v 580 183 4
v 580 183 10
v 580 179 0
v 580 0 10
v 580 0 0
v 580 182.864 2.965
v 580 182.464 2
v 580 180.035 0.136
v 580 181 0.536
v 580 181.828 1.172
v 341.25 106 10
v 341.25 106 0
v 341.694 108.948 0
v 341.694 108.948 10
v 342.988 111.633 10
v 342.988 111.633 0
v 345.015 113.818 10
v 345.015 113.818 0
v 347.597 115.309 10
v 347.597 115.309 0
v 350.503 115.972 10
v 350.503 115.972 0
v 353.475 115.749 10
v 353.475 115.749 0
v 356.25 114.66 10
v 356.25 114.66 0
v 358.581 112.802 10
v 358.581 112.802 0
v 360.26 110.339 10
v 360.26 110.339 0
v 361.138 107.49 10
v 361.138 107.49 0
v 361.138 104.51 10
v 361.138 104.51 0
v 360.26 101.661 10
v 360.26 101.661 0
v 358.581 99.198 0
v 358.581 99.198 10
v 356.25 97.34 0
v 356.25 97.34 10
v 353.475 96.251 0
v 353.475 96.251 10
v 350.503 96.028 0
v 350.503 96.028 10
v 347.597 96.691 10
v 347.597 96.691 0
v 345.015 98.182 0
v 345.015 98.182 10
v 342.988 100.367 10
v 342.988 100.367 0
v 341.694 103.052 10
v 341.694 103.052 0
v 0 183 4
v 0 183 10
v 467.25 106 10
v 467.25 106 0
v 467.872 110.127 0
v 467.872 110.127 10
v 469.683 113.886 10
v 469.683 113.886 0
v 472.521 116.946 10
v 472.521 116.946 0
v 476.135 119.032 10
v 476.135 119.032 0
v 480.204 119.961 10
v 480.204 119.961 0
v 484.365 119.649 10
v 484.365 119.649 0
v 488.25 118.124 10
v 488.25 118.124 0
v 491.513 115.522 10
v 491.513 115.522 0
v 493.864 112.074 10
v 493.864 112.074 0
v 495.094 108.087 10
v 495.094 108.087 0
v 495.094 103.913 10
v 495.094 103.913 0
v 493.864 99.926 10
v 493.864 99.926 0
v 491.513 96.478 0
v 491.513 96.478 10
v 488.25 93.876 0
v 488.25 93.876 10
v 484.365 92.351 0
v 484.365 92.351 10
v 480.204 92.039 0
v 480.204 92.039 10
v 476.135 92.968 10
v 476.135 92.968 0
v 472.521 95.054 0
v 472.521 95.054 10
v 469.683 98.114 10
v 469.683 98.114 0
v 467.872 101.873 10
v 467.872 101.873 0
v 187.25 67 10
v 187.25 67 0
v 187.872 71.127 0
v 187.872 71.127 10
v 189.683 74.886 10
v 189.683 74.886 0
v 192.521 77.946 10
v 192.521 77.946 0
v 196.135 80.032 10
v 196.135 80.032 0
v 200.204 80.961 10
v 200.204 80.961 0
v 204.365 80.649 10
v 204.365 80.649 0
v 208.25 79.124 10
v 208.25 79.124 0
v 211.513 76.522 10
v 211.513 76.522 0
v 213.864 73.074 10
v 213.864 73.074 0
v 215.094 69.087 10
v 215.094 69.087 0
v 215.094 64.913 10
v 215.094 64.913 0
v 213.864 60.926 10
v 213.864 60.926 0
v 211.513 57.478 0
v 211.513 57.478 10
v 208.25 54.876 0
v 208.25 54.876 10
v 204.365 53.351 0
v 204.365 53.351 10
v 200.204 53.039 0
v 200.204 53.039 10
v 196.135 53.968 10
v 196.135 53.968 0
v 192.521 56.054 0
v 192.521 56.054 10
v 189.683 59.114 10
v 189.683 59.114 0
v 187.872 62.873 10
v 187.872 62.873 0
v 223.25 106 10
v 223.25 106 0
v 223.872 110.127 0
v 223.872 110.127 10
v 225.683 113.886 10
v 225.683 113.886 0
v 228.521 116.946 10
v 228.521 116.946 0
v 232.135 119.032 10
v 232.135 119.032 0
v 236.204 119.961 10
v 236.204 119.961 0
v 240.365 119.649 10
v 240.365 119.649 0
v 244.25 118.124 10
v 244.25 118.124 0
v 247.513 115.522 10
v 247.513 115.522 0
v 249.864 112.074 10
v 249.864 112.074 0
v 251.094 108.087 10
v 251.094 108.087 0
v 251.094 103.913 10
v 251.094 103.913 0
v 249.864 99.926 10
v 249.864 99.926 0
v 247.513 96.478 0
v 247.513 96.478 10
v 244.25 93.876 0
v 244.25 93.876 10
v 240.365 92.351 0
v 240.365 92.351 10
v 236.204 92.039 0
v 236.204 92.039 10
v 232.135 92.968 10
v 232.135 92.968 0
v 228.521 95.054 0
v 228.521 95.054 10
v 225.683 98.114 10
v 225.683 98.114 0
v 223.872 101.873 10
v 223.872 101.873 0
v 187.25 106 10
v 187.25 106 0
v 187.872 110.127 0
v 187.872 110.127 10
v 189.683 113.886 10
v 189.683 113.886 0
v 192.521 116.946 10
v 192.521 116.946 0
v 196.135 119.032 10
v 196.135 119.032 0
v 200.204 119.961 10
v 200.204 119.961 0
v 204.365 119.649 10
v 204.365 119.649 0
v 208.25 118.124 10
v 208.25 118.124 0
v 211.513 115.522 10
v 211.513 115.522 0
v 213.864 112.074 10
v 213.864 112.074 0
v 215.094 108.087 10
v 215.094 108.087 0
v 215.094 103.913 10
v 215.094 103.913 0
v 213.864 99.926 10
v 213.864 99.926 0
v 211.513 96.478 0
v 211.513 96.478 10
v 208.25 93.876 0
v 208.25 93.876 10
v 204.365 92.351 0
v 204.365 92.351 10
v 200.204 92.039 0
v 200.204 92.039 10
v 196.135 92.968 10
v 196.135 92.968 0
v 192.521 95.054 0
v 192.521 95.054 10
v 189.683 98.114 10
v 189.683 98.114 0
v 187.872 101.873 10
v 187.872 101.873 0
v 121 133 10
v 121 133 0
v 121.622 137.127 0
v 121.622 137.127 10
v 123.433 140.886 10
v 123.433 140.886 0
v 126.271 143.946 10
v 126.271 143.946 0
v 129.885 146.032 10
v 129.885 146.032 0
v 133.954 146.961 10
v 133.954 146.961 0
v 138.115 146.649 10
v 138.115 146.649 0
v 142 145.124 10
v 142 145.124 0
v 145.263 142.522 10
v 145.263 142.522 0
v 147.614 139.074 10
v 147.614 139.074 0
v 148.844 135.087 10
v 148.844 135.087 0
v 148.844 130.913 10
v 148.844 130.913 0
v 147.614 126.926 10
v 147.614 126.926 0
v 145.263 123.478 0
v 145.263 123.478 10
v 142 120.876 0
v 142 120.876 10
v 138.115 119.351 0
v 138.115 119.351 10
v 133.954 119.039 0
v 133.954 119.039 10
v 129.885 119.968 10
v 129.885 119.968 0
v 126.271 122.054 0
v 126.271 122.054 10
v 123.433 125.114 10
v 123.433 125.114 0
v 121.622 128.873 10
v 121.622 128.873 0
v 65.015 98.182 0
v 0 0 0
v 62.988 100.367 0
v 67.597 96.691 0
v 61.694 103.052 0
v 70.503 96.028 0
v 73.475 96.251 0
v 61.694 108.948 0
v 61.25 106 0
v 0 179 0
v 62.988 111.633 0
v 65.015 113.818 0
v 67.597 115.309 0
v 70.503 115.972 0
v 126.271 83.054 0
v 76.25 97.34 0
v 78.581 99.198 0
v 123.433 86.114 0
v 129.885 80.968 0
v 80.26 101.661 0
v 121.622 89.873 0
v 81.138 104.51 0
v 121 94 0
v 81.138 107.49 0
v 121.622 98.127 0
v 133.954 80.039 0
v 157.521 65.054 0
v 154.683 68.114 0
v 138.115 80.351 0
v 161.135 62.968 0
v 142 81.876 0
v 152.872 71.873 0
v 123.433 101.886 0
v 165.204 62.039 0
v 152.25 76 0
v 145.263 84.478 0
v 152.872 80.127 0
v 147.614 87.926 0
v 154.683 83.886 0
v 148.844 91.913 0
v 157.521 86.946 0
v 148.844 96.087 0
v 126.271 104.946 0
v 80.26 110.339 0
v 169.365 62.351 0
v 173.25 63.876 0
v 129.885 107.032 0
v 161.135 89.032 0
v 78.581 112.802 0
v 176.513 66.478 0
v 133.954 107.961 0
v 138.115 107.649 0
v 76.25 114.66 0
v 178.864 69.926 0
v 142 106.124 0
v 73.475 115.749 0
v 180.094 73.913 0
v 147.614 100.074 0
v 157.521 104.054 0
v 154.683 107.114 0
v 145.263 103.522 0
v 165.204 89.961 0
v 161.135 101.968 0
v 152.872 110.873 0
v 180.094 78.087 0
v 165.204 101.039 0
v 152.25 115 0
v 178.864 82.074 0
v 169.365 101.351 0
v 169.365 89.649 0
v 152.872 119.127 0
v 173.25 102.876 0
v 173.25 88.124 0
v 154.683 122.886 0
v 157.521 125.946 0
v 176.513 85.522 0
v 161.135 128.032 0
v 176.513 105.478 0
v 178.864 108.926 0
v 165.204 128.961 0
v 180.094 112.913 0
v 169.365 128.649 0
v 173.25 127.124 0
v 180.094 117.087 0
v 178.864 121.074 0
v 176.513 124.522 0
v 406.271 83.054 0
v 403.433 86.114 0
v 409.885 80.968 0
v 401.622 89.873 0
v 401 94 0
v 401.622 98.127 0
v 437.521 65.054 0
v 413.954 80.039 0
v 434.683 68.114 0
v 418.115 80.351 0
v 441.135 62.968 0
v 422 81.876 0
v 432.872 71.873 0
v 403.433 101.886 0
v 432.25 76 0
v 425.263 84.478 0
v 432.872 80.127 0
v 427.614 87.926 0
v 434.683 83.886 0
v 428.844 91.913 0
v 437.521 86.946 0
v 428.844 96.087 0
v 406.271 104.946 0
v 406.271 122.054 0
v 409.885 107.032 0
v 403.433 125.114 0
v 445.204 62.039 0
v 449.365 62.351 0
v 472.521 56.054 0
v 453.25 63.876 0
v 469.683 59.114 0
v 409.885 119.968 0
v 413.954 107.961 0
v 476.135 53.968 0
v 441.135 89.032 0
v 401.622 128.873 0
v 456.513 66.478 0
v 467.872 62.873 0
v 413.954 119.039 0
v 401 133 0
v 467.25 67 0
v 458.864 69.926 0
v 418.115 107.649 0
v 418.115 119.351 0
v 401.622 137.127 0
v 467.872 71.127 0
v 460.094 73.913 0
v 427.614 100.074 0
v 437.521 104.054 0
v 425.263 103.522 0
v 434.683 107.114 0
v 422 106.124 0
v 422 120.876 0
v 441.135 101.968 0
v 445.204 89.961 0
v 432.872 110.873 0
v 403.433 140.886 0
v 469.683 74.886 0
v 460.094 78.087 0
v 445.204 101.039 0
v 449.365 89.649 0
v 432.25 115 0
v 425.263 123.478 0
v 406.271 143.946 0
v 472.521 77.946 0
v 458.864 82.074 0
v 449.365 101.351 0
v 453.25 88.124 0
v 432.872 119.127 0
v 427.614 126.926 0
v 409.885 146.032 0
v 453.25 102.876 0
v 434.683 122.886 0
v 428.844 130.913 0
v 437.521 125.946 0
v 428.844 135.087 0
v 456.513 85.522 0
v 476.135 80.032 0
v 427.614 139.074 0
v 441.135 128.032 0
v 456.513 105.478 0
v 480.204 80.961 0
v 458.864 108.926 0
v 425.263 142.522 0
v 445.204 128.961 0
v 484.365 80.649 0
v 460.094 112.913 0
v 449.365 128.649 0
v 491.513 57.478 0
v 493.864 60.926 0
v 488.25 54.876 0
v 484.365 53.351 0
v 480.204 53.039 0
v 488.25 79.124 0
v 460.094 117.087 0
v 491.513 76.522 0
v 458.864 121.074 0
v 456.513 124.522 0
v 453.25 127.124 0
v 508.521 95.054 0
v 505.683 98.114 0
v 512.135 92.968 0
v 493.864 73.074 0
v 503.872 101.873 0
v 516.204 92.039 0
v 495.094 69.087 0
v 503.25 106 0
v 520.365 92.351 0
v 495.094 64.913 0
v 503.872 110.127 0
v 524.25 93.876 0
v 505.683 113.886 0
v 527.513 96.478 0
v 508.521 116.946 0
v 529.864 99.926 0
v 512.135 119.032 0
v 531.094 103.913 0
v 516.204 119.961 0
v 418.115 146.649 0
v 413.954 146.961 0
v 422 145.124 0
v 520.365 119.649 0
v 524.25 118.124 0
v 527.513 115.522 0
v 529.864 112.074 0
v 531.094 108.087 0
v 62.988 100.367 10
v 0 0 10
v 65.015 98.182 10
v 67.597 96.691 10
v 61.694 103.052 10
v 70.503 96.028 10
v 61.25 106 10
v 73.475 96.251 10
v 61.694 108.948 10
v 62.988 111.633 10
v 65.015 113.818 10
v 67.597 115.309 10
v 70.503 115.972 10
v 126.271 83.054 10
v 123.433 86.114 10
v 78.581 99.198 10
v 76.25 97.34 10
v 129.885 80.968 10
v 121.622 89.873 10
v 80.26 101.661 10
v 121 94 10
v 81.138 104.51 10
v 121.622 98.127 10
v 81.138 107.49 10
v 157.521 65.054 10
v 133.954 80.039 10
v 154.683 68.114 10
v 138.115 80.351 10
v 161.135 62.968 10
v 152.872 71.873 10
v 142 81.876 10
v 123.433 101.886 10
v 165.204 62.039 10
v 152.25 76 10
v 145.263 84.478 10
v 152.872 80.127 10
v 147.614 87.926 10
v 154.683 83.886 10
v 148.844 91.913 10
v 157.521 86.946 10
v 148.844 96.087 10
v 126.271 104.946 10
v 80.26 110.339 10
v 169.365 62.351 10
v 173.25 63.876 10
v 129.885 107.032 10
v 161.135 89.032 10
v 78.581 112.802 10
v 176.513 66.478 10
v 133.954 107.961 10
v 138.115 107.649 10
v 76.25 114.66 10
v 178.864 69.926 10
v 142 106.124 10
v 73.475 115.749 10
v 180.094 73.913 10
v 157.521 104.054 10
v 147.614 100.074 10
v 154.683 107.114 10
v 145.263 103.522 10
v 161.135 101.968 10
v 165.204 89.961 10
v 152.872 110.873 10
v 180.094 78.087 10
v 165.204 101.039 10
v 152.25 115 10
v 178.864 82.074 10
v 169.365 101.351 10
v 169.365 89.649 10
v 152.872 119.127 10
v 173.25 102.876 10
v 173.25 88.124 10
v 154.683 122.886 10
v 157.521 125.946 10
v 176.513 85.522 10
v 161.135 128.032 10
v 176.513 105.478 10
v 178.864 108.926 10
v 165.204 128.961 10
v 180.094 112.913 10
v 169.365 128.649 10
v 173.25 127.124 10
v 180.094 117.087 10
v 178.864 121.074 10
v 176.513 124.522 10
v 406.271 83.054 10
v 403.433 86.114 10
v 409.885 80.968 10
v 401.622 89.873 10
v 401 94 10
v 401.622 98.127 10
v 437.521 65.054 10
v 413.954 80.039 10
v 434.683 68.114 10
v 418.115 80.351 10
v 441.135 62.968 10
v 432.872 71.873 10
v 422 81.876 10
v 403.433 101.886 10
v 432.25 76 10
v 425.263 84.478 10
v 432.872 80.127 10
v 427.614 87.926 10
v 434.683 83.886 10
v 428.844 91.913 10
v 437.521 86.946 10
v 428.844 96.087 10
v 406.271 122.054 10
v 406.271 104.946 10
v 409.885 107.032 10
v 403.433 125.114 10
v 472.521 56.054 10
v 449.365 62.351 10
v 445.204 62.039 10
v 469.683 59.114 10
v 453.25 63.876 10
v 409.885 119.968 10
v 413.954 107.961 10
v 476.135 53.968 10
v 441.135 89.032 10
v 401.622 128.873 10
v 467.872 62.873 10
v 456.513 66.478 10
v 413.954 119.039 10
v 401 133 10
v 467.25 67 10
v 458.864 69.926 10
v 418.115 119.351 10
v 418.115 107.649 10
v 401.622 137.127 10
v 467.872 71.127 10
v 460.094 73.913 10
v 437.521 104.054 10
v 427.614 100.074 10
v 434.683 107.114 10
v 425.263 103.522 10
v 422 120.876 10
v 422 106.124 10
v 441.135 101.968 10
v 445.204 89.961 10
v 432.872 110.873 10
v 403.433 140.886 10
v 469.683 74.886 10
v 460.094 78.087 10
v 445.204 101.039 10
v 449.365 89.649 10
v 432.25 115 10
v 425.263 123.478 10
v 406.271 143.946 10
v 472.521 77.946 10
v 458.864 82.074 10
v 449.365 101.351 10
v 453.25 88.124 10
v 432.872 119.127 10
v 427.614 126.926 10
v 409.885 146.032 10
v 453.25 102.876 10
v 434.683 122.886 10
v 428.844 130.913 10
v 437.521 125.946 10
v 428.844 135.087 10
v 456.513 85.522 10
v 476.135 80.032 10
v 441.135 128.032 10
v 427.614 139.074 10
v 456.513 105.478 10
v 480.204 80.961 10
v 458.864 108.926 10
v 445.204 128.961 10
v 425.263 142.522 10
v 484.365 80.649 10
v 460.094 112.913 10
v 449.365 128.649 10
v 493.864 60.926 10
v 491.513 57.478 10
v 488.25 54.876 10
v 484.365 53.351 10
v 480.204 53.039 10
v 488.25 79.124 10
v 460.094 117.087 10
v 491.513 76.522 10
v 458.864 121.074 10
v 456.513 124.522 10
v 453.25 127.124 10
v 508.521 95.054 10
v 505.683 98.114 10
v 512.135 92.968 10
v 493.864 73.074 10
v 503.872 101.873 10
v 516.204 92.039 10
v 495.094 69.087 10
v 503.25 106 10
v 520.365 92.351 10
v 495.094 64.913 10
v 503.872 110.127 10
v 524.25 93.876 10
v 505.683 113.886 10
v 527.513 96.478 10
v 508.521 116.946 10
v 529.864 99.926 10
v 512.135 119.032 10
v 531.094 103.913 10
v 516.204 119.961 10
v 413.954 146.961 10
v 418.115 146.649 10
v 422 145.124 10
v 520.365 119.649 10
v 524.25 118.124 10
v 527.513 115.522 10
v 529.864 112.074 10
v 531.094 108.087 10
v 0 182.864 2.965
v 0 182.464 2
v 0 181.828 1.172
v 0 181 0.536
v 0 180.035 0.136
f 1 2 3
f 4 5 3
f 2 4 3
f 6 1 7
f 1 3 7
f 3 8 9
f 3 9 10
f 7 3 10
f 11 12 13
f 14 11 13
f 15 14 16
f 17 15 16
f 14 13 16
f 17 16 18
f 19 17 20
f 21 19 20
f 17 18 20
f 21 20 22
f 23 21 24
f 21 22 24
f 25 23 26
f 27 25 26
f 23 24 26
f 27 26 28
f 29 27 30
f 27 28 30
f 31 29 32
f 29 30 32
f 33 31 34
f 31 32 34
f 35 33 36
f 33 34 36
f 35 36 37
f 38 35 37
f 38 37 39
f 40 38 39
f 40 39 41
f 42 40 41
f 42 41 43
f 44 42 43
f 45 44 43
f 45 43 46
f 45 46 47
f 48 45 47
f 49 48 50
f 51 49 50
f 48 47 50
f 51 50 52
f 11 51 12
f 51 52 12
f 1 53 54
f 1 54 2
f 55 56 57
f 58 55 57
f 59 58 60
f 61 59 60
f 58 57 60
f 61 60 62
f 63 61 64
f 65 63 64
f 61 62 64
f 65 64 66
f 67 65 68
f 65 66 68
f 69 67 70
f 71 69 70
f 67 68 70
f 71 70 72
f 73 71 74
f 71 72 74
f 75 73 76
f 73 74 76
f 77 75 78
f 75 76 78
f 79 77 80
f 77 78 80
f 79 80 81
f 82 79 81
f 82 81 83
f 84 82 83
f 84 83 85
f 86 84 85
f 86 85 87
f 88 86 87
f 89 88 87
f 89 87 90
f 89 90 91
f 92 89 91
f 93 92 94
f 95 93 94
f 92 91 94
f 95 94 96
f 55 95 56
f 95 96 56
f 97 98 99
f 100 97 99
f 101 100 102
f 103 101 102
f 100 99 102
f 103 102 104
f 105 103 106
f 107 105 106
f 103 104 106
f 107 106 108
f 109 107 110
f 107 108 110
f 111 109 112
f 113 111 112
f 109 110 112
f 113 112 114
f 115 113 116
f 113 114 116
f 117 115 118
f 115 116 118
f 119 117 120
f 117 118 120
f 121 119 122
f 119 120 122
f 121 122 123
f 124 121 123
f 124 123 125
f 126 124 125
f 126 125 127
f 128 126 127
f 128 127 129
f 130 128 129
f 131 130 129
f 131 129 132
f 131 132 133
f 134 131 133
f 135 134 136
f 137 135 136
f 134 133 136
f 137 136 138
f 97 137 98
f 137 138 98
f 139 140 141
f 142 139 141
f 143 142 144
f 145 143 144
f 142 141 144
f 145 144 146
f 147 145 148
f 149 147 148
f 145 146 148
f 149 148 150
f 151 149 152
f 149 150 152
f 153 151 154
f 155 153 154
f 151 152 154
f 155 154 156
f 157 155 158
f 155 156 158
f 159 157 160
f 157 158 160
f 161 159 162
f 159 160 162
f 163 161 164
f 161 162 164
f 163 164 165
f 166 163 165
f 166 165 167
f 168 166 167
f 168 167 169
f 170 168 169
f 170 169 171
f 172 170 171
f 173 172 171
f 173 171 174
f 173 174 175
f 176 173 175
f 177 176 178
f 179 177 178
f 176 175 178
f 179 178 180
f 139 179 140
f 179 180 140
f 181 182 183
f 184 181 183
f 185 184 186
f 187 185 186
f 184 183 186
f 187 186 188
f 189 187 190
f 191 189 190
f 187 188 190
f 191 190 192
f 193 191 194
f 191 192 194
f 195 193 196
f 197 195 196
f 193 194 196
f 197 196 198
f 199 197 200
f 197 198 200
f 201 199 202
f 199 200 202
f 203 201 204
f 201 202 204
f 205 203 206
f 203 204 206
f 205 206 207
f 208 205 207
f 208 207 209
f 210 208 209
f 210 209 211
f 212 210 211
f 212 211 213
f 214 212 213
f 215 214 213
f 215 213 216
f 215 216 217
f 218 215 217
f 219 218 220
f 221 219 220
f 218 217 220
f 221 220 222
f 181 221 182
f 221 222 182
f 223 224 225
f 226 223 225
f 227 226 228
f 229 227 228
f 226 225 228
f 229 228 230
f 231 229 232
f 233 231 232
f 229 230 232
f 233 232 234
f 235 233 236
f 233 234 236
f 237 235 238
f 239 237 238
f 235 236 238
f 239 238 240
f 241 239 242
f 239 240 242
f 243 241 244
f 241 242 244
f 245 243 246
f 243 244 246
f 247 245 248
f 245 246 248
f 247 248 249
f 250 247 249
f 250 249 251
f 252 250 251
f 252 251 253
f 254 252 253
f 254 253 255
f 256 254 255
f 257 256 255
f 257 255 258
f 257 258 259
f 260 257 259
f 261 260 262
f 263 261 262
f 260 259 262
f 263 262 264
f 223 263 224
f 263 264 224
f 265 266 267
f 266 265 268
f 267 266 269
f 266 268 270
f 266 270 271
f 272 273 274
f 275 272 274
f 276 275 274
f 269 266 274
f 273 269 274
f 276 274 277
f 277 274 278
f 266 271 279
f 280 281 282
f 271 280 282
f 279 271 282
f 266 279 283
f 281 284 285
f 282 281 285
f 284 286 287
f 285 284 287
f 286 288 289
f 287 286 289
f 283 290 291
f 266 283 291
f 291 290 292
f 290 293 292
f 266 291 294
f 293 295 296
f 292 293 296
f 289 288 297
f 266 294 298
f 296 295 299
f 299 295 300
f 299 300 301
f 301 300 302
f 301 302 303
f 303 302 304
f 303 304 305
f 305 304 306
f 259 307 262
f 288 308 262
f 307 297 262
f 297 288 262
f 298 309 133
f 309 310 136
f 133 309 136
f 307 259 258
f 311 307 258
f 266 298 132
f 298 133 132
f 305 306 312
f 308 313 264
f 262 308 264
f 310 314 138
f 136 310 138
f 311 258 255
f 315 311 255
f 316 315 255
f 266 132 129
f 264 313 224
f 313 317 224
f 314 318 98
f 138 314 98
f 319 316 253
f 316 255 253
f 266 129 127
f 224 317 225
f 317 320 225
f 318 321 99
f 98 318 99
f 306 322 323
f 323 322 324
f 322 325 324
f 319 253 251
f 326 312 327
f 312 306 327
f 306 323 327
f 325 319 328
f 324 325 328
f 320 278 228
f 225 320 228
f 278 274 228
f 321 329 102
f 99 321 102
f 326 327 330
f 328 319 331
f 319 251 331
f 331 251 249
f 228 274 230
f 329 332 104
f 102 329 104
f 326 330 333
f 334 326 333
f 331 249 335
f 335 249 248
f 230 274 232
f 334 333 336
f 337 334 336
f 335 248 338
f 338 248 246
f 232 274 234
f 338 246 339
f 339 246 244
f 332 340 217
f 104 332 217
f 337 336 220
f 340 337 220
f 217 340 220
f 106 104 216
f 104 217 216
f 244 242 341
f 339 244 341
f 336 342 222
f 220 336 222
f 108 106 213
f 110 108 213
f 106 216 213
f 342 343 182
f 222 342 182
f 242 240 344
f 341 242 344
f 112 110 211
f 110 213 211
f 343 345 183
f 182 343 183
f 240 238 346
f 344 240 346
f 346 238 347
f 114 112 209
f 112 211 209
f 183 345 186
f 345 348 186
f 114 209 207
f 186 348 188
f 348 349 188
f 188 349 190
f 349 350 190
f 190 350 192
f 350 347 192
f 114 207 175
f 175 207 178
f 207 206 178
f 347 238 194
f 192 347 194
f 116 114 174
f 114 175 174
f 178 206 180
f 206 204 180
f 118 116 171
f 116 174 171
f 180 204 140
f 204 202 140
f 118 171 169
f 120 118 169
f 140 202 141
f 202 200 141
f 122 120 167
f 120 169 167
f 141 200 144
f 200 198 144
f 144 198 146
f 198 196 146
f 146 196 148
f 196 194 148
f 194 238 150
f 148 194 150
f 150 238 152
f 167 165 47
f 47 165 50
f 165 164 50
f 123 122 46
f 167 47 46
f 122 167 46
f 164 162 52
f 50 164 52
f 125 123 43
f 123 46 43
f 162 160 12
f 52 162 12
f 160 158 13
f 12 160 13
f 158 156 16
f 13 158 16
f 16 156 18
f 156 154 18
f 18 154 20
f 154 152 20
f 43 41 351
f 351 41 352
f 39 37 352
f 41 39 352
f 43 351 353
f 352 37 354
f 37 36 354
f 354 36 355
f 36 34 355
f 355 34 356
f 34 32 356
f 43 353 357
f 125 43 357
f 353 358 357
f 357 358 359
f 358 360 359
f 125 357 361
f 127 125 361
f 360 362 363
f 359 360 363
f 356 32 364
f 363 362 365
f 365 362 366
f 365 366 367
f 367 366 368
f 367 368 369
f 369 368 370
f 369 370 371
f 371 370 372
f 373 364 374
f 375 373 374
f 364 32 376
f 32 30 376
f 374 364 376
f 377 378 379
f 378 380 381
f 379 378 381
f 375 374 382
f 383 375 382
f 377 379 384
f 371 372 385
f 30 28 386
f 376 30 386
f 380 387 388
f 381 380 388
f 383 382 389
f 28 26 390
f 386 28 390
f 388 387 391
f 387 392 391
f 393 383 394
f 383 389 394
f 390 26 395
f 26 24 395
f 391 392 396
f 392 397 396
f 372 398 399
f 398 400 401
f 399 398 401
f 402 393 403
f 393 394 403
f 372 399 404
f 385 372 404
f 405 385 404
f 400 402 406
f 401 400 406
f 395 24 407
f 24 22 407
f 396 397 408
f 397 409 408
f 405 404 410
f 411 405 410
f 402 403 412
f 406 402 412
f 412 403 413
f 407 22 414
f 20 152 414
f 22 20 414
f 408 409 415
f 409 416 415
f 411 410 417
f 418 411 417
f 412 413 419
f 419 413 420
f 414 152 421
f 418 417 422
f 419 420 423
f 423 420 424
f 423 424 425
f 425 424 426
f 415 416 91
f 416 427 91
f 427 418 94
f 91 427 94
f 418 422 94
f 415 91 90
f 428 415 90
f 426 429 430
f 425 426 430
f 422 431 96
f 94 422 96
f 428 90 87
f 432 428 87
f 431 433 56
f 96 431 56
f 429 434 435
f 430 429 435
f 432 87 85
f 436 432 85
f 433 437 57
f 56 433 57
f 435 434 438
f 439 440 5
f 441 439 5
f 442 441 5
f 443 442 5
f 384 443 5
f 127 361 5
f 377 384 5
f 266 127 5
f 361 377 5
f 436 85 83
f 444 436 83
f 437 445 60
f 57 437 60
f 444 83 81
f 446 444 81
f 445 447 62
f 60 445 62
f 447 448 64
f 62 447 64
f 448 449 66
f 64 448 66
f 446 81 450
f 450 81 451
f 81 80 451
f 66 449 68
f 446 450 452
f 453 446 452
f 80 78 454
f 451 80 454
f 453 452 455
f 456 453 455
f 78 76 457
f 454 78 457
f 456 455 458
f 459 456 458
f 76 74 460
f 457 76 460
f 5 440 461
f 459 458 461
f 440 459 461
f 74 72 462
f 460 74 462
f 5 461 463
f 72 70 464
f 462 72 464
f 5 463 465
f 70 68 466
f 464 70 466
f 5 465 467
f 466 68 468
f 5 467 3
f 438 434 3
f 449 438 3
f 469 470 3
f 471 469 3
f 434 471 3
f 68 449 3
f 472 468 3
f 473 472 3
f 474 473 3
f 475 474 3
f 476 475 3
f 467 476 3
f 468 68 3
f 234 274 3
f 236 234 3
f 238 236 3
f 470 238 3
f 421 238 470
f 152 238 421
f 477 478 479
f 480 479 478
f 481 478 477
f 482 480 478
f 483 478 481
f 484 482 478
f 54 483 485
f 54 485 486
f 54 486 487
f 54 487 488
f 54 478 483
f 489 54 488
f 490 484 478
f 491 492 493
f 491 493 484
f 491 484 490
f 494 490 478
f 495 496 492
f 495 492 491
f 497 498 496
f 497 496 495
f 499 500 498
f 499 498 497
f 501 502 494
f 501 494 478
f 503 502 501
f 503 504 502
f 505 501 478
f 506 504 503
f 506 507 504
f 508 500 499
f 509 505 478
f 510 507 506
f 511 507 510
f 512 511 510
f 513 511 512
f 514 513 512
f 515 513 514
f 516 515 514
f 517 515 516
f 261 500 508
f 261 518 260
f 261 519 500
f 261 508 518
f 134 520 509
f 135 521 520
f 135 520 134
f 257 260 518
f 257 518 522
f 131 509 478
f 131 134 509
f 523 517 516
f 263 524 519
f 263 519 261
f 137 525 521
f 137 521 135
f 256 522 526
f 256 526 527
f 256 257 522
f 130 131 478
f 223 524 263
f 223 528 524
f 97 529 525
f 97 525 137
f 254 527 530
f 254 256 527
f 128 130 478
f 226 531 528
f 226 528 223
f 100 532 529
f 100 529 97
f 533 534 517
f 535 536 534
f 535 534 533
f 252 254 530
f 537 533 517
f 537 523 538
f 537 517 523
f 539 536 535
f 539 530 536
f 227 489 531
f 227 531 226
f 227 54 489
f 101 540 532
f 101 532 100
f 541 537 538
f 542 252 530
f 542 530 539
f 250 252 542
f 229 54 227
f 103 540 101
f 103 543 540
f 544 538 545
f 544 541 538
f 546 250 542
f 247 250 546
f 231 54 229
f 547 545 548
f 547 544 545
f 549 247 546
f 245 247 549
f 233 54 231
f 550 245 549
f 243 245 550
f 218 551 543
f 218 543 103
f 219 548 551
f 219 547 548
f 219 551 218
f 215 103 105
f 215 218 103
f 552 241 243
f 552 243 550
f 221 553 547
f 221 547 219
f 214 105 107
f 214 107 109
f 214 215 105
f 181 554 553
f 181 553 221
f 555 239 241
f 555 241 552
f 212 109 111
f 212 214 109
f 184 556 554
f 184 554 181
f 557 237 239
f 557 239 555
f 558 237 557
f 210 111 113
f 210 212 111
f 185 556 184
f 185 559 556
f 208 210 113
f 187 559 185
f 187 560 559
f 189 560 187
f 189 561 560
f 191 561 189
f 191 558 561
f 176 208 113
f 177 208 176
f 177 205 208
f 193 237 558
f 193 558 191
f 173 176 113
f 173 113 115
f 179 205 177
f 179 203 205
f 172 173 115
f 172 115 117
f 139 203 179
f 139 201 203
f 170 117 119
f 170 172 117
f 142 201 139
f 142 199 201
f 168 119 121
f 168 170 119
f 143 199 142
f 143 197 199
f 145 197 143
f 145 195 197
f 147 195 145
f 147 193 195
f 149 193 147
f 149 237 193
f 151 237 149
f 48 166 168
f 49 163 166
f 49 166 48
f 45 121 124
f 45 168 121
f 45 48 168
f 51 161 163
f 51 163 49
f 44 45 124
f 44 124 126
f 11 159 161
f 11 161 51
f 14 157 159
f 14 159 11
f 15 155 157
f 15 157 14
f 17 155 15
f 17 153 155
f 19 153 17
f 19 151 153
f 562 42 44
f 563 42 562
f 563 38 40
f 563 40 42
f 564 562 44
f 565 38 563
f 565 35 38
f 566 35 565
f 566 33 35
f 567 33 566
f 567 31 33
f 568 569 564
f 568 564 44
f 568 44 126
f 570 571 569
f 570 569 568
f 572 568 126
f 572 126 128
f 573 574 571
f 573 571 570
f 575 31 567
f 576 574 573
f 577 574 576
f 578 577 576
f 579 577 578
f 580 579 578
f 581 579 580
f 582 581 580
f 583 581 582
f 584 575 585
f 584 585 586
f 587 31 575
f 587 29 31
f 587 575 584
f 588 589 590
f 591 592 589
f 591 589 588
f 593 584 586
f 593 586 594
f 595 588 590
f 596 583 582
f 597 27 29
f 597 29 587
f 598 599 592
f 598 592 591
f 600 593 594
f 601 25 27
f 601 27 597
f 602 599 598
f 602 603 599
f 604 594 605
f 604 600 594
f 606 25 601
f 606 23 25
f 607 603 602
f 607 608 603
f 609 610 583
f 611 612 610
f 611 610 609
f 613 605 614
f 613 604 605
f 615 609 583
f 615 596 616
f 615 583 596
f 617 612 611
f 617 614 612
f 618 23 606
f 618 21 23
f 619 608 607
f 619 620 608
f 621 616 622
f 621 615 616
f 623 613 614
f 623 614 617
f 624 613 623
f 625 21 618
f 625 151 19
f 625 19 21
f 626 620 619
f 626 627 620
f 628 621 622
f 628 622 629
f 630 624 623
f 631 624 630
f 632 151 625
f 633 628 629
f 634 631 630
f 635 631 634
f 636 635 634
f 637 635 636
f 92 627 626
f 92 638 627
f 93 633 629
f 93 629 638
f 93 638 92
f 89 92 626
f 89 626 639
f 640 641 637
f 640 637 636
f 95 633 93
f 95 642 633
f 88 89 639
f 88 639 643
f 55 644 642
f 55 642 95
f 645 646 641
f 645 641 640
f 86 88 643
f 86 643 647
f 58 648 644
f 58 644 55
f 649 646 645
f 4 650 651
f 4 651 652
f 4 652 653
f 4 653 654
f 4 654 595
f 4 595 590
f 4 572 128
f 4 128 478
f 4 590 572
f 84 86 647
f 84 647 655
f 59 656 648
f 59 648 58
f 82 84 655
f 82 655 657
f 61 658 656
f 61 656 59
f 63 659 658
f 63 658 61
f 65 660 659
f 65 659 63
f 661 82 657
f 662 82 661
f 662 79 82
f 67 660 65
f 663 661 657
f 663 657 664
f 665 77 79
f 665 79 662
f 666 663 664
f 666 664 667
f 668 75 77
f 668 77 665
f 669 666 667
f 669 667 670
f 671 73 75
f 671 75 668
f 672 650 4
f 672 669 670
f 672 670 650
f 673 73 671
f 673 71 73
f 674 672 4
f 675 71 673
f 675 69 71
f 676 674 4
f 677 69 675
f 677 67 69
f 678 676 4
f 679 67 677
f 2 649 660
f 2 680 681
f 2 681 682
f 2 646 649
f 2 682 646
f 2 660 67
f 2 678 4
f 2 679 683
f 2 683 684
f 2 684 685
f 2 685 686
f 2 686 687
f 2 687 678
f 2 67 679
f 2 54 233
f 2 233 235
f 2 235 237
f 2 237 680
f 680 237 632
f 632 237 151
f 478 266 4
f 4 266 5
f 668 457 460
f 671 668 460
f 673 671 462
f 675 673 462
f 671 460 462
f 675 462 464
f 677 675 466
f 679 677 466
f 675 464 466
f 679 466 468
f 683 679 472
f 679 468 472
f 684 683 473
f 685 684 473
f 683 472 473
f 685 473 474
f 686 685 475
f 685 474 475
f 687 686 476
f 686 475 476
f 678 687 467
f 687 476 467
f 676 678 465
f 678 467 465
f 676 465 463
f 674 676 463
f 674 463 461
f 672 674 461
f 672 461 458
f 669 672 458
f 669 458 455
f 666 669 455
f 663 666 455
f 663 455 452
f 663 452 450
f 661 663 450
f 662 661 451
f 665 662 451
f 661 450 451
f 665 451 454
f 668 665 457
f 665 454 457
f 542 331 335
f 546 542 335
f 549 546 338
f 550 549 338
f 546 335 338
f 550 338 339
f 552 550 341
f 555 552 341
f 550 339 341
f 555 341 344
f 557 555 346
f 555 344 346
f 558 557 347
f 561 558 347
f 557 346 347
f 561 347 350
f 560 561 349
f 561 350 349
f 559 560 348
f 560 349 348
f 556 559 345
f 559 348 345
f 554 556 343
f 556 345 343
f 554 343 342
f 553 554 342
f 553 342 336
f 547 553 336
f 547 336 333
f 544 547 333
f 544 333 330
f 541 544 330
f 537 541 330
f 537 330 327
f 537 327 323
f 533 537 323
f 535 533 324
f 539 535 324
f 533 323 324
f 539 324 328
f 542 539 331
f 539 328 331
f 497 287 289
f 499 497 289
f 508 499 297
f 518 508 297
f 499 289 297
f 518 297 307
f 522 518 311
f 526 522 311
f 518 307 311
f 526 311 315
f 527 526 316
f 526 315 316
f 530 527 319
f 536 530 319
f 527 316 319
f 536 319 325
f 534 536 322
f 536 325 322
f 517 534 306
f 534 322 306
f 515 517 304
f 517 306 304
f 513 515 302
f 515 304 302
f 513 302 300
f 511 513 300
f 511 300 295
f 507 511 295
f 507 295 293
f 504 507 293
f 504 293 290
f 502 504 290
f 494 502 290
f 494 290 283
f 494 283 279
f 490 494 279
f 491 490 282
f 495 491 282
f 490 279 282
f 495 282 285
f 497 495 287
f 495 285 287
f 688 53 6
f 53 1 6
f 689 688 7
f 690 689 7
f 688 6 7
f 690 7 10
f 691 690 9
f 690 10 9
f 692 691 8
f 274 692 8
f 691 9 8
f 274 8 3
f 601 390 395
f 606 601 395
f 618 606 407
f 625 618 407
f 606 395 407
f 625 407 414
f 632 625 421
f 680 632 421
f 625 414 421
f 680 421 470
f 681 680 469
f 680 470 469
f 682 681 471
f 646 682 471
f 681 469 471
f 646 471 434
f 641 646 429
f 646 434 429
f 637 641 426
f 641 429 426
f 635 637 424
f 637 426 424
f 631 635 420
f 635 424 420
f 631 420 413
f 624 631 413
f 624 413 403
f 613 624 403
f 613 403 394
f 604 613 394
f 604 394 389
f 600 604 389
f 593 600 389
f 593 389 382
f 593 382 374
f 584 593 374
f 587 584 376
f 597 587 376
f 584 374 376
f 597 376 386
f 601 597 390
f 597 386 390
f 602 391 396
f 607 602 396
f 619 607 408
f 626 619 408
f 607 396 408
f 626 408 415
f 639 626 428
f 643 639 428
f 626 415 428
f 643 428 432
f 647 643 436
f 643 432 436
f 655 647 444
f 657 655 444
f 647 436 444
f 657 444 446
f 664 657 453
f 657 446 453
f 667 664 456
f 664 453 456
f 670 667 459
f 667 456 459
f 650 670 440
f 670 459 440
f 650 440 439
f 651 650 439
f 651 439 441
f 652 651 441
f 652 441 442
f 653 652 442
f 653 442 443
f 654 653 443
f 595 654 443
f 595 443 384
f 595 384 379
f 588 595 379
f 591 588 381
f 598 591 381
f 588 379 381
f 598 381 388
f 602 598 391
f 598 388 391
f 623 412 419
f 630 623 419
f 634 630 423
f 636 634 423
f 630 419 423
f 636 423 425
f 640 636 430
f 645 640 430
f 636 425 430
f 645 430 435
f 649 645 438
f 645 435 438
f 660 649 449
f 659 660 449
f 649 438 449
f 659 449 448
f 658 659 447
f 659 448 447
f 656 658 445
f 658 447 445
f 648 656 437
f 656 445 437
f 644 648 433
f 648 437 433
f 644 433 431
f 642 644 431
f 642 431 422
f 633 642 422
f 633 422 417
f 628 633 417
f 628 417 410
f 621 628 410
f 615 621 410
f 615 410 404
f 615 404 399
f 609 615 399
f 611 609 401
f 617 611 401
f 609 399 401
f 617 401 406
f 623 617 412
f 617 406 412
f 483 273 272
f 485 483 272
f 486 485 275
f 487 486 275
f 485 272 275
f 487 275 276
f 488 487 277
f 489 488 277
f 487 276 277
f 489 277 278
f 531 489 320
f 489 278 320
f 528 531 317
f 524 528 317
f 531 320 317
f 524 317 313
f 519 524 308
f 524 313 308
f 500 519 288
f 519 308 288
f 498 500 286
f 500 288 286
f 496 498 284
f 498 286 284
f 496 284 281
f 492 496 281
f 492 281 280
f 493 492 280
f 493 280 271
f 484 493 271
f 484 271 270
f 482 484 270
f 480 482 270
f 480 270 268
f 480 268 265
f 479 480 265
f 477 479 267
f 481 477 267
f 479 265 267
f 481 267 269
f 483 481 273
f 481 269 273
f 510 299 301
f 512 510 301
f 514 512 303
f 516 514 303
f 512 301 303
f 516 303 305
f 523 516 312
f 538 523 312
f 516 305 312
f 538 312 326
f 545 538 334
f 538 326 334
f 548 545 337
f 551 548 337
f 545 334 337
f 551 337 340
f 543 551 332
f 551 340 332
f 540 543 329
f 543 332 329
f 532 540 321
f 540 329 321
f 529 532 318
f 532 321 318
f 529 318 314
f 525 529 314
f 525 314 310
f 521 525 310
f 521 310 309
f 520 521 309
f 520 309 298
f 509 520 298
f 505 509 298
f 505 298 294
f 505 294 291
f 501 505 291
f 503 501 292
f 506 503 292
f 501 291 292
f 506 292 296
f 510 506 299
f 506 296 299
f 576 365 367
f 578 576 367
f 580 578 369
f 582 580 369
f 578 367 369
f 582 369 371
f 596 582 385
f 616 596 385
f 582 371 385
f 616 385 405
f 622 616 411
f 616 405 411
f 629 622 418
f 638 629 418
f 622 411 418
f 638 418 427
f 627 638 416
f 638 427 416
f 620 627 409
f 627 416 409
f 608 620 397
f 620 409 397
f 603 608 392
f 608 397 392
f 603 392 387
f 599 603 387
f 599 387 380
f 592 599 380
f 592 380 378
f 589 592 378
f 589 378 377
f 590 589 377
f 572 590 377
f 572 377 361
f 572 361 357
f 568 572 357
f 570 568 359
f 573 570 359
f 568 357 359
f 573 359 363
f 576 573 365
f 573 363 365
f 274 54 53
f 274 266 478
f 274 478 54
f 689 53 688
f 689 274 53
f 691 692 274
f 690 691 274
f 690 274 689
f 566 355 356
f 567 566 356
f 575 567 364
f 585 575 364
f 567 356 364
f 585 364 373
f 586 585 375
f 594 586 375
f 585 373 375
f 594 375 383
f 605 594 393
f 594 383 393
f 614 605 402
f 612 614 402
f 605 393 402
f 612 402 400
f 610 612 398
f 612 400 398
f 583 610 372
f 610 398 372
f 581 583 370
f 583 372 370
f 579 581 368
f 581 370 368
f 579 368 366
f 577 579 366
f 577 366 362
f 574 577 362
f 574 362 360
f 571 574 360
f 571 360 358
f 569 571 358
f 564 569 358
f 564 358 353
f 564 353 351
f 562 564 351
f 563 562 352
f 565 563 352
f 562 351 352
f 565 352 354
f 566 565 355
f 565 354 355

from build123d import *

# Parameters (mm, degrees)
ESQUISSE1_W                = 580
ESQUISSE1_H                = 183
BOSS_EXTRU_1_DEPTH         = 10
ESQUISSE3_R                = 14
ESQUISSE3_R_2              = 10
ENL_V_MAT_EXTRU_1_DEPTH    = 10
R_P_TITION_LIN_AIRE1_COUNT = 2
R_P_TITION_LIN_AIRE1_PITCH = 280
CONG_1_R                   = 4


with BuildPart() as part:
    # Esquisse1 → Boss.-Extru.1 (new body)
    with BuildSketch(Plane.XY):
        with Locations((290, 91.5)):
            Rectangle(ESQUISSE1_W, ESQUISSE1_H)
    extrude(amount=BOSS_EXTRU_1_DEPTH)

    # Esquisse3 → Enlèv. mat.-Extru.1 (cut)
    with BuildSketch(Plane(origin=(0, 0, 0), x_dir=(-1, 0, 0), z_dir=(0, 0, -1))):
        with Locations((-201.25, 67)):
            Circle(ESQUISSE3_R)
        with Locations((-71.25, 106)):
            Circle(ESQUISSE3_R_2)
        with Locations((-166.25, 76)):
            Circle(ESQUISSE3_R)
        with Locations((-135, 94)):
            Circle(ESQUISSE3_R)
        with Locations((-237.25, 106)):
            Circle(ESQUISSE3_R)
        with Locations((-201.25, 106)):
            Circle(ESQUISSE3_R)
        with Locations((-166.25, 115)):
            Circle(ESQUISSE3_R)
        with Locations((-135, 133)):
            Circle(ESQUISSE3_R)
    enl_v_mat_extru_1 = extrude(amount=-ENL_V_MAT_EXTRU_1_DEPTH, mode=Mode.SUBTRACT)

    # Répétition linéaire1: Enlèv. mat.-Extru.1 ×2
    with Locations(*[(i * R_P_TITION_LIN_AIRE1_PITCH, 0, 0) for i in range(1, R_P_TITION_LIN_AIRE1_COUNT)]):
        add(enl_v_mat_extru_1, mode=Mode.SUBTRACT)

    # Congé1
    cong_1_edges = [part.edges().sort_by_distance(p)[0] for p in [
        (290, 183, 0),
    ]]
    fillet(cong_1_edges, radius=CONG_1_R)


solid = part.part
